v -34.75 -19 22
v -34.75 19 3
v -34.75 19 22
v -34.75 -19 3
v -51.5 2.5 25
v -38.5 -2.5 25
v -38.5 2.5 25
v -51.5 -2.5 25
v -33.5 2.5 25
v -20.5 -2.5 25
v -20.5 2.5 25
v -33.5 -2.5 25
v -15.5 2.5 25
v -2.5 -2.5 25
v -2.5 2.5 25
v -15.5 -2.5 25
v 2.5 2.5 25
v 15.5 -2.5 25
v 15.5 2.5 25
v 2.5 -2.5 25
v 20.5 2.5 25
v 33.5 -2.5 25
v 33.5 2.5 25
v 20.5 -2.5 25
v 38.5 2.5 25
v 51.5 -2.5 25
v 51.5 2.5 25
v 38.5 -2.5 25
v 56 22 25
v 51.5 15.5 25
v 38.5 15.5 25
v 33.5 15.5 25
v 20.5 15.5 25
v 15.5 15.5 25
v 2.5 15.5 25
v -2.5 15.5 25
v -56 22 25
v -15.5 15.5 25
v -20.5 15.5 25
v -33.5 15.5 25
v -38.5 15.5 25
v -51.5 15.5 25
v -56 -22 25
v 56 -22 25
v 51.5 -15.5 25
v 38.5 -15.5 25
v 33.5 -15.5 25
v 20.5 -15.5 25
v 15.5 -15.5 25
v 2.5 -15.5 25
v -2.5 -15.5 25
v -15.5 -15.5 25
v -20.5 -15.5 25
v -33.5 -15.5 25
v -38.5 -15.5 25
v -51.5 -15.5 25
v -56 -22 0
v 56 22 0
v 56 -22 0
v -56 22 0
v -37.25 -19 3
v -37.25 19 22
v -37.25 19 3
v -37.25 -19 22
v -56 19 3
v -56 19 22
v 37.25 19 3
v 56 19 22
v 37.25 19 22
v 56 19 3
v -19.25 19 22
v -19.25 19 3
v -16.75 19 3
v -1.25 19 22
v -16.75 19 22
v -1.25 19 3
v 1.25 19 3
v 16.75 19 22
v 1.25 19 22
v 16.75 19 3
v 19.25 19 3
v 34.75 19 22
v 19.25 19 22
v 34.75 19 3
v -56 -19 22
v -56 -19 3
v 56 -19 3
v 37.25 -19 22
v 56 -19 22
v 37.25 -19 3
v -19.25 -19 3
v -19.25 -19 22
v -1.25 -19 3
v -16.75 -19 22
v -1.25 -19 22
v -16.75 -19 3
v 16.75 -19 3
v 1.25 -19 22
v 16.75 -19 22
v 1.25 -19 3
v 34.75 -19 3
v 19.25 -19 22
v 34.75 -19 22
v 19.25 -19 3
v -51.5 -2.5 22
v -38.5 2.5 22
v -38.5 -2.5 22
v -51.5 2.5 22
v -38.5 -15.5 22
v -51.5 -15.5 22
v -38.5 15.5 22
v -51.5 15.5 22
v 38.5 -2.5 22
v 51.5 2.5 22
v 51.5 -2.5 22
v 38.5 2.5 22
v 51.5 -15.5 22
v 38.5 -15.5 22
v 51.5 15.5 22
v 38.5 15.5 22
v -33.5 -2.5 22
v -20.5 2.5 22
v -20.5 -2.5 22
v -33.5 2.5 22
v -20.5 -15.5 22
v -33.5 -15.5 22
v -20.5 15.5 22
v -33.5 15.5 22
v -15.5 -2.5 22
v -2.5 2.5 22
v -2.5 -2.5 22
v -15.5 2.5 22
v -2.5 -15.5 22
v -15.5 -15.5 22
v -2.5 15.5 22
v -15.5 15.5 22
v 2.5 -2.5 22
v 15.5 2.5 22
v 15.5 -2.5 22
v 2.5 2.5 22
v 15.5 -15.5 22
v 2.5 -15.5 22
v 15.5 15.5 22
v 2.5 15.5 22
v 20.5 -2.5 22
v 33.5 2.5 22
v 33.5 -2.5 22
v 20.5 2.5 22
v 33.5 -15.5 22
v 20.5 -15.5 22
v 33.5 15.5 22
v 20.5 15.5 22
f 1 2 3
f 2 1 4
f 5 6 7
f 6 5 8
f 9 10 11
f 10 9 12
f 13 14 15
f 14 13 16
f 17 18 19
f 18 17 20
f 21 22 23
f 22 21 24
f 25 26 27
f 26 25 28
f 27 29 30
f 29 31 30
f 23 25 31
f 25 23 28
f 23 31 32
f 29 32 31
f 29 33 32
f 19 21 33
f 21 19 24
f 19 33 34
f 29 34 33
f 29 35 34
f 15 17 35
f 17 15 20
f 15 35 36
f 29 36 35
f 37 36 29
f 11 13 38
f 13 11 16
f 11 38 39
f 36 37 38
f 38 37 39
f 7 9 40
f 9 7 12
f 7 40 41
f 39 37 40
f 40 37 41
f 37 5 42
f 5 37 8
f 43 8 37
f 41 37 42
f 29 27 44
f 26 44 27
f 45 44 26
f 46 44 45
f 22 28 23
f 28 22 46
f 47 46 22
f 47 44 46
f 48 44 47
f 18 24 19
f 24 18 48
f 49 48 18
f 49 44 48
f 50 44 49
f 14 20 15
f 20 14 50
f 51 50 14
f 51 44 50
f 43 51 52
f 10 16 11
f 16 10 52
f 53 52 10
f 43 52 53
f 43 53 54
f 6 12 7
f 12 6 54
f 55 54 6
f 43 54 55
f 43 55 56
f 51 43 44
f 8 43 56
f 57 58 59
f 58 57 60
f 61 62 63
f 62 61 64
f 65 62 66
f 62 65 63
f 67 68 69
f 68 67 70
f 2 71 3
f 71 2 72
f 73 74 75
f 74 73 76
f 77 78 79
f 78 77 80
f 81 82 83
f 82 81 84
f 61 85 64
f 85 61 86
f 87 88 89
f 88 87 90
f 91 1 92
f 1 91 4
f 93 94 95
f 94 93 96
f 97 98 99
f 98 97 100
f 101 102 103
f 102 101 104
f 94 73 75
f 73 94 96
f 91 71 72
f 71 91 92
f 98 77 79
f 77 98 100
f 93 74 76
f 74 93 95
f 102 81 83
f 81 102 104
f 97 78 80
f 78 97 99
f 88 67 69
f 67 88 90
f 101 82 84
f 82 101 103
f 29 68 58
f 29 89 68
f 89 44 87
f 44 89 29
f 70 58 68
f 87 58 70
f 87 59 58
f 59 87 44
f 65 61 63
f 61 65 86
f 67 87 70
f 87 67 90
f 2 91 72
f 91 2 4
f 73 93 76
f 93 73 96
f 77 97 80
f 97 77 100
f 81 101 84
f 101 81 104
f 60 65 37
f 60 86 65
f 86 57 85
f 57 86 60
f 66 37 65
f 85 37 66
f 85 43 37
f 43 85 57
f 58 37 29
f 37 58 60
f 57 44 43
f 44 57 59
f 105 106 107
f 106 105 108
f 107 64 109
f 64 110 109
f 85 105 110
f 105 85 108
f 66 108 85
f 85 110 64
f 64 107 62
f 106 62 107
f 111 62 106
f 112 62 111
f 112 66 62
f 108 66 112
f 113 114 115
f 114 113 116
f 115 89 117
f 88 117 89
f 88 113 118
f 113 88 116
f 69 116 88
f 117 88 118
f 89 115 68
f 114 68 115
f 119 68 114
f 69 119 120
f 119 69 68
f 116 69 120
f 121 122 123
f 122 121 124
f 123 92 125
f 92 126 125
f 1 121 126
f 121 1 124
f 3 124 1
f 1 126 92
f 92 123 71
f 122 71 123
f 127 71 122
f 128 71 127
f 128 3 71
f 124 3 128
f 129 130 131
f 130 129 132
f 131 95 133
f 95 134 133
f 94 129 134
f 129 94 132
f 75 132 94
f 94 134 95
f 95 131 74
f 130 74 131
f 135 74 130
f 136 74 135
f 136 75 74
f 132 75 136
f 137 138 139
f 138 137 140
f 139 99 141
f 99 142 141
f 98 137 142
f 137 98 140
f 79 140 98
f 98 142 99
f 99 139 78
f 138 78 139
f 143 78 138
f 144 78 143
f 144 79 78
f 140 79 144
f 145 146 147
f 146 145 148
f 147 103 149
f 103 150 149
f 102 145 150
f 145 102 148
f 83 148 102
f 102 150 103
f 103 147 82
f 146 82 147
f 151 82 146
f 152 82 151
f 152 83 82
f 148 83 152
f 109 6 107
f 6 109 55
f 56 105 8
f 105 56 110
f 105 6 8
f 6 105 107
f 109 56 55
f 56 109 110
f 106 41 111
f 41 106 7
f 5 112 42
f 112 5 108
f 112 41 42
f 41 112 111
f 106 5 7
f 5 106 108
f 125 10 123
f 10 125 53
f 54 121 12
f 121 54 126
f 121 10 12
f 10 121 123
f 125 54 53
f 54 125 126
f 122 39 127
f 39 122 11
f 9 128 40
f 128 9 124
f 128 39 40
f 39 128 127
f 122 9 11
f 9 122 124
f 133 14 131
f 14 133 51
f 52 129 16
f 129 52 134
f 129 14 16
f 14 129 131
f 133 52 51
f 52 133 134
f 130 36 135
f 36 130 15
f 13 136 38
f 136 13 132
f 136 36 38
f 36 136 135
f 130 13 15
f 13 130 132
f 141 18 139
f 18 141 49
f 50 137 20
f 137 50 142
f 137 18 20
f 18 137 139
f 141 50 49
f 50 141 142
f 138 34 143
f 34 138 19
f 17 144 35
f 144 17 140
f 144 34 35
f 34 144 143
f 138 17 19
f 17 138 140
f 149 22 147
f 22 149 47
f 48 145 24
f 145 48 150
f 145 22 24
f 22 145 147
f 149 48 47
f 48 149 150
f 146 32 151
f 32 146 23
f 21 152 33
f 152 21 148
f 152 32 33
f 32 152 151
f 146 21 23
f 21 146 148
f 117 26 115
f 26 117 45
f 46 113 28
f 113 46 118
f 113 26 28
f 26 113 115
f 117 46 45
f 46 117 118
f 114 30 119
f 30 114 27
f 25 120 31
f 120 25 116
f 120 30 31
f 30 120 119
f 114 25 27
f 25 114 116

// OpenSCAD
// Cuvette Rack - 12 slots (2 rows × 6 columns)
// Dimensions in millimeters

// Base and deck dimensions
base_x = 112;           // Base plate width (X)
base_y = 44;            // Base plate depth (Y)
base_z = 3;             // Base plate thickness
deck_z = 3;             // Deck plate thickness
deck_bottom_z = 22;     // Deck bottom position (z)
deck_top_z = 25;        // Deck top position (z)

// Wall dimensions
wall_height = 25;       // Height from bottom to top
end_wall_thick = 3;     // Thickness of end walls (Y direction)
rib_thick = 2.5;        // Thickness of ribs (X direction)

// Rib depths and positions
rib_y_inner = 19;       // Ribs run from y = -19 to y = 19 (38 mm deep)
rib_y_start = -rib_y_inner;
rib_y_depth = 2 * rib_y_inner;  // 38 mm

// Rib positions (X coordinates)
rib_x_positions = [-36, -18, 0, 18, 36];

// Hole dimensions and spacing
hole_size = 13;         // Square hole side length (mm)
hole_spacing_x = 18;    // X spacing between hole centers
hole_spacing_y = 18;    // Y spacing between hole centers

// Set resolution for curved shapes
$fn = 64;

difference() {
    // Positive geometry: base, deck, and walls
    union() {
        // Base plate (z = 0 to 3)
        translate([-base_x/2, -base_y/2, 0])
            cube([base_x, base_y, base_z]);
        
        // Deck plate (z = 22 to 25)
        translate([-base_x/2, -base_y/2, deck_bottom_z])
            cube([base_x, base_y, deck_z]);
        
        // Back end wall (at y = 22, 3 mm thick, extends inward to y = 19)
        translate([-base_x/2, base_y/2 - end_wall_thick, 0])
            cube([base_x, end_wall_thick, wall_height]);
        
        // Front end wall (at y = -22, 3 mm thick, extends inward to y = -19)
        translate([-base_x/2, -base_y/2, 0])
            cube([base_x, end_wall_thick, wall_height]);
        
        // Five vertical ribs (2.5 mm thick each, 38 mm deep from y = -19 to y = 19)
        for (x = rib_x_positions) {
            translate([x - rib_thick/2, rib_y_start, 0])
                cube([rib_thick, rib_y_depth, wall_height]);
        }
    }
    
    // Negative geometry: through-holes in deck plate
    // 2 rows (Y) × 6 columns (X) of 13 × 13 mm square holes
    // 18 mm center-to-center spacing, centered on deck
    for (i = [0:5]) {
        for (j = [0:1]) {
            x = -45 + i * hole_spacing_x;    // X positions: -45, -27, -9, 9, 27, 45
            y = -9 + j * hole_spacing_y;     // Y positions: -9, 9
            // Cutting box extends beyond deck to ensure clean holes
            translate([x - hole_size/2, y - hole_size/2, deck_bottom_z - 0.5])
                cube([hole_size, hole_size, deck_top_z - deck_bottom_z + 1]);
        }
    }
}
